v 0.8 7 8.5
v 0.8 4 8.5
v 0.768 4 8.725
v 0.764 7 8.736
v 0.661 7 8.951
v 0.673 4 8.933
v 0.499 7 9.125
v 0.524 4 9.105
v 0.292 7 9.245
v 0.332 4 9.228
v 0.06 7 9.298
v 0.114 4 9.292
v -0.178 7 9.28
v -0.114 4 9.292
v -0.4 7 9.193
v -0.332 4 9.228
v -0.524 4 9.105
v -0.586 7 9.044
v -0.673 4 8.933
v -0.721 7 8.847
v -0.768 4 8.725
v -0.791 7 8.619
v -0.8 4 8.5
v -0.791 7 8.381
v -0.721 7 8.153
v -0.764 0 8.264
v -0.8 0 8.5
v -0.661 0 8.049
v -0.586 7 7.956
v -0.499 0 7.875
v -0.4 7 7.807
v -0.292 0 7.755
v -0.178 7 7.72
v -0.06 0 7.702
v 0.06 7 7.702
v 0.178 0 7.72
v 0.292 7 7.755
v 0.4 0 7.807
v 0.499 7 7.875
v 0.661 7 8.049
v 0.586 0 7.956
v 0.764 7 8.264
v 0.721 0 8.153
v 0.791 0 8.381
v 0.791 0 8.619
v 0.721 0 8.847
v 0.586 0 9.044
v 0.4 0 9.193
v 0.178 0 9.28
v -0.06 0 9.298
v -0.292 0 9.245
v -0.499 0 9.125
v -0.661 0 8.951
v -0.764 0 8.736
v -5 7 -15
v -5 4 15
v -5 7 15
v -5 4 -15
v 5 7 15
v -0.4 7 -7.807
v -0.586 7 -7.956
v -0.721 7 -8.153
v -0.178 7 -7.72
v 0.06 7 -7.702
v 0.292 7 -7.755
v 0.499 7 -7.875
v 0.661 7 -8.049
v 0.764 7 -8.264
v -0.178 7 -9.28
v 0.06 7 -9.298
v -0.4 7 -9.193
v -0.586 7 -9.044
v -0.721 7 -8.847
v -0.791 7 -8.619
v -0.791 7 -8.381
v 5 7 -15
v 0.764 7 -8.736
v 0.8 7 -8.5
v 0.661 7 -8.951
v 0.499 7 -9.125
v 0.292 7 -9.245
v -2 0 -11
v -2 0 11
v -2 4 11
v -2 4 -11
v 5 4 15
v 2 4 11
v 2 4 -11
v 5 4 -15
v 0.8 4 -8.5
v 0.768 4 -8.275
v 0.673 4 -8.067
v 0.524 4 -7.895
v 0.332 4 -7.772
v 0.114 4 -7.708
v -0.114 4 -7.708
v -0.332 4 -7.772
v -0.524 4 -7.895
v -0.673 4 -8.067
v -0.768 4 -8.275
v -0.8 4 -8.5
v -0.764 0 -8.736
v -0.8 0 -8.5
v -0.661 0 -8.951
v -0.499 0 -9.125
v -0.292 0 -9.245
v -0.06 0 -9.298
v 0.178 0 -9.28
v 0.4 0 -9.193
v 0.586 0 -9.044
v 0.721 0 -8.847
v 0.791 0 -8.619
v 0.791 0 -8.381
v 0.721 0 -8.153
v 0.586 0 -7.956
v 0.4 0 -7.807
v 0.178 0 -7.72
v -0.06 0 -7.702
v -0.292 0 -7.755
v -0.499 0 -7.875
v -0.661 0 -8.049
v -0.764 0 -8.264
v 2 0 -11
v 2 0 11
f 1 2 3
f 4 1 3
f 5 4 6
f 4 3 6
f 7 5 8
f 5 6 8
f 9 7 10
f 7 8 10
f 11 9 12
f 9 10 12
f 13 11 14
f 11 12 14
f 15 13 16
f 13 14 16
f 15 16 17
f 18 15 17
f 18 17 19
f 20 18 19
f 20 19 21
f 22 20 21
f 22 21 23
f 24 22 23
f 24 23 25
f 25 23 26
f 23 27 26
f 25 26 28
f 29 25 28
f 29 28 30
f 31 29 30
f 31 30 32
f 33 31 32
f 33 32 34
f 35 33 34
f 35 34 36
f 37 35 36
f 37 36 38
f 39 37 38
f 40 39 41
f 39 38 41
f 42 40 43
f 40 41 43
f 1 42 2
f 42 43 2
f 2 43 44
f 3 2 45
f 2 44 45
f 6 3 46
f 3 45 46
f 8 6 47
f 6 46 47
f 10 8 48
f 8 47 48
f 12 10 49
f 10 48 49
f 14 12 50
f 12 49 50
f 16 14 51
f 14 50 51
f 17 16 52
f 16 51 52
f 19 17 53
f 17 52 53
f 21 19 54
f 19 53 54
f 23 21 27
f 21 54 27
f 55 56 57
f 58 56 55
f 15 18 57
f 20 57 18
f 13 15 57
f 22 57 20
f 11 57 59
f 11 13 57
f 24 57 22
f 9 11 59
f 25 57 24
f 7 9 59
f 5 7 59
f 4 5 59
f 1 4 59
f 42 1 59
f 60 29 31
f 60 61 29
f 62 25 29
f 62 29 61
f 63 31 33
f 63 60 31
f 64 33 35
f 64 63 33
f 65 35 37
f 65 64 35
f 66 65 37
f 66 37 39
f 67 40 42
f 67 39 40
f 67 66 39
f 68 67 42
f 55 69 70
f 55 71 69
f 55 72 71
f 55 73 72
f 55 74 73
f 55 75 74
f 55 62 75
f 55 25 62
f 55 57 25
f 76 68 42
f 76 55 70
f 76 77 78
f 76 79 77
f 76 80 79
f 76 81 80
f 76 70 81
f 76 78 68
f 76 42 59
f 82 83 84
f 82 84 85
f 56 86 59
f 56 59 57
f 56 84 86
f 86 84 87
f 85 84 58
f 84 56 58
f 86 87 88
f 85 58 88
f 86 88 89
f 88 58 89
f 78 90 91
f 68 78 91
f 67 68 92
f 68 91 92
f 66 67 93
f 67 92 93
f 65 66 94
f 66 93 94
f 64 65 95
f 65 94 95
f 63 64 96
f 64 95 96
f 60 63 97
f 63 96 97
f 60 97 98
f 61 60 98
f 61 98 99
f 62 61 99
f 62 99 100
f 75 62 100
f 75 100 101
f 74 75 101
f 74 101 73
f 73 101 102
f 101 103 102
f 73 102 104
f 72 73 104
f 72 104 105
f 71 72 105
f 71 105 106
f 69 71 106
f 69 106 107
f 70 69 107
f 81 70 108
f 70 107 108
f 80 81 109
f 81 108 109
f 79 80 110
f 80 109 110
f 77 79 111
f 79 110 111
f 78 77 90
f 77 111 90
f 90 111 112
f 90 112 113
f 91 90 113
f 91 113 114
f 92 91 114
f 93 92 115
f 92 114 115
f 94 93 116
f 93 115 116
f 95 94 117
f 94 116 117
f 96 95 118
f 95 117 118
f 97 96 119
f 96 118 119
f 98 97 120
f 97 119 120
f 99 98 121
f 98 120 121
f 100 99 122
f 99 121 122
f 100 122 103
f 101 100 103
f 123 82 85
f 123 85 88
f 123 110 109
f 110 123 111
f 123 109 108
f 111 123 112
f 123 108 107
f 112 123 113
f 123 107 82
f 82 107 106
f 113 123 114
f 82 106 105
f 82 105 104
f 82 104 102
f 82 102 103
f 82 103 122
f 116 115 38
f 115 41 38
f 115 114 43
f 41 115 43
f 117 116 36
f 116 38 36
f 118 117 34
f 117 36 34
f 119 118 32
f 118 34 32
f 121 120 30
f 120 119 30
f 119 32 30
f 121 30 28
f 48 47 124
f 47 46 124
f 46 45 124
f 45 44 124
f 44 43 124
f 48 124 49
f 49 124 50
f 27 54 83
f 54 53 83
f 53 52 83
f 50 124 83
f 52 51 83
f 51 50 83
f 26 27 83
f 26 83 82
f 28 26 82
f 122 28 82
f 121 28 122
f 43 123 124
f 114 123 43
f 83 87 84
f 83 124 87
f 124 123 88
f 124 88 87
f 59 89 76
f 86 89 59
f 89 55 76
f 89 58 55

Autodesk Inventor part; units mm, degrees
ref_plane "YZ Plane" through (0, 0, 0) normal (1, 0, 0) x (0, 1, 0)
ref_plane "XZ Plane" through (0, 0, 0) normal (0, 1, 0) x (-1, 0, 0)
ref_plane "XY Plane" through (0, 0, 0) normal (0, 0, 1) x (1, 0, 0)
sketch "スケッチ1" plane through (0, 0, 0) normal (0, 1, 0) x (-1, 0, 0)
  line L0 (-2, 11) -> (2, 11)
  line L1 (2, 11) -> (2, -11)
  line L2 (2, -11) -> (-2, -11)
  line L3 (-2, -11) -> (-2, 11)
  line L4 (-2, 11) -> (2, -11) construction
  line L5 (2, 11) -> (-2, -11) construction
  circle A0 centre (0, 8.5) radius 0.8
  line L6 (0, -15.4) -> (0, 15.4) construction
  circle A1 centre (0, -8.5) radius 0.8
  line L7 (2.8, 0) -> (-2.8, 0) projected
  point P0 (0, 0)
  dimension "d0" = 4
  dimension "d1" = 2.5
  dimension "d2" = 1.6
  dimension "d3" = 22
extrude "押し出し1" add sketch "スケッチ1" along normal blind 4
sketch "スケッチ2" plane through (0, 4, 0) normal (0, 1, 0) x (1, 0, 0)
  line L0 (5, -15) -> (-5, -15)
  line L1 (-5, -15) -> (-5, 15)
  line L2 (-5, 15) -> (5, 15)
  line L3 (5, 15) -> (5, -15)
  line L4 (5, -15) -> (-5, 15) construction
  line L5 (-5, -15) -> (5, 15) construction
  line L6 (2, -11) -> (2, 11) projected
  line L7 (2, 11) -> (-2, 11) projected
  line L8 (-2, 11) -> (-2, -11) projected
  line L9 (-2, -11) -> (2, -11) projected
  circle A0 centre (0, 8.5) radius 0.8 projected
  circle A1 centre (0, -8.5) radius 0.8 projected
  point P0 (0, 0)
  dimension "d6" = 30
  dimension "d7" = 10
extrude "押し出し2" add sketch "スケッチ2" along normal blind 3 contours L0 L1 L2 L3 | L9 L8 L7 L6
properties part number "Zigu"
